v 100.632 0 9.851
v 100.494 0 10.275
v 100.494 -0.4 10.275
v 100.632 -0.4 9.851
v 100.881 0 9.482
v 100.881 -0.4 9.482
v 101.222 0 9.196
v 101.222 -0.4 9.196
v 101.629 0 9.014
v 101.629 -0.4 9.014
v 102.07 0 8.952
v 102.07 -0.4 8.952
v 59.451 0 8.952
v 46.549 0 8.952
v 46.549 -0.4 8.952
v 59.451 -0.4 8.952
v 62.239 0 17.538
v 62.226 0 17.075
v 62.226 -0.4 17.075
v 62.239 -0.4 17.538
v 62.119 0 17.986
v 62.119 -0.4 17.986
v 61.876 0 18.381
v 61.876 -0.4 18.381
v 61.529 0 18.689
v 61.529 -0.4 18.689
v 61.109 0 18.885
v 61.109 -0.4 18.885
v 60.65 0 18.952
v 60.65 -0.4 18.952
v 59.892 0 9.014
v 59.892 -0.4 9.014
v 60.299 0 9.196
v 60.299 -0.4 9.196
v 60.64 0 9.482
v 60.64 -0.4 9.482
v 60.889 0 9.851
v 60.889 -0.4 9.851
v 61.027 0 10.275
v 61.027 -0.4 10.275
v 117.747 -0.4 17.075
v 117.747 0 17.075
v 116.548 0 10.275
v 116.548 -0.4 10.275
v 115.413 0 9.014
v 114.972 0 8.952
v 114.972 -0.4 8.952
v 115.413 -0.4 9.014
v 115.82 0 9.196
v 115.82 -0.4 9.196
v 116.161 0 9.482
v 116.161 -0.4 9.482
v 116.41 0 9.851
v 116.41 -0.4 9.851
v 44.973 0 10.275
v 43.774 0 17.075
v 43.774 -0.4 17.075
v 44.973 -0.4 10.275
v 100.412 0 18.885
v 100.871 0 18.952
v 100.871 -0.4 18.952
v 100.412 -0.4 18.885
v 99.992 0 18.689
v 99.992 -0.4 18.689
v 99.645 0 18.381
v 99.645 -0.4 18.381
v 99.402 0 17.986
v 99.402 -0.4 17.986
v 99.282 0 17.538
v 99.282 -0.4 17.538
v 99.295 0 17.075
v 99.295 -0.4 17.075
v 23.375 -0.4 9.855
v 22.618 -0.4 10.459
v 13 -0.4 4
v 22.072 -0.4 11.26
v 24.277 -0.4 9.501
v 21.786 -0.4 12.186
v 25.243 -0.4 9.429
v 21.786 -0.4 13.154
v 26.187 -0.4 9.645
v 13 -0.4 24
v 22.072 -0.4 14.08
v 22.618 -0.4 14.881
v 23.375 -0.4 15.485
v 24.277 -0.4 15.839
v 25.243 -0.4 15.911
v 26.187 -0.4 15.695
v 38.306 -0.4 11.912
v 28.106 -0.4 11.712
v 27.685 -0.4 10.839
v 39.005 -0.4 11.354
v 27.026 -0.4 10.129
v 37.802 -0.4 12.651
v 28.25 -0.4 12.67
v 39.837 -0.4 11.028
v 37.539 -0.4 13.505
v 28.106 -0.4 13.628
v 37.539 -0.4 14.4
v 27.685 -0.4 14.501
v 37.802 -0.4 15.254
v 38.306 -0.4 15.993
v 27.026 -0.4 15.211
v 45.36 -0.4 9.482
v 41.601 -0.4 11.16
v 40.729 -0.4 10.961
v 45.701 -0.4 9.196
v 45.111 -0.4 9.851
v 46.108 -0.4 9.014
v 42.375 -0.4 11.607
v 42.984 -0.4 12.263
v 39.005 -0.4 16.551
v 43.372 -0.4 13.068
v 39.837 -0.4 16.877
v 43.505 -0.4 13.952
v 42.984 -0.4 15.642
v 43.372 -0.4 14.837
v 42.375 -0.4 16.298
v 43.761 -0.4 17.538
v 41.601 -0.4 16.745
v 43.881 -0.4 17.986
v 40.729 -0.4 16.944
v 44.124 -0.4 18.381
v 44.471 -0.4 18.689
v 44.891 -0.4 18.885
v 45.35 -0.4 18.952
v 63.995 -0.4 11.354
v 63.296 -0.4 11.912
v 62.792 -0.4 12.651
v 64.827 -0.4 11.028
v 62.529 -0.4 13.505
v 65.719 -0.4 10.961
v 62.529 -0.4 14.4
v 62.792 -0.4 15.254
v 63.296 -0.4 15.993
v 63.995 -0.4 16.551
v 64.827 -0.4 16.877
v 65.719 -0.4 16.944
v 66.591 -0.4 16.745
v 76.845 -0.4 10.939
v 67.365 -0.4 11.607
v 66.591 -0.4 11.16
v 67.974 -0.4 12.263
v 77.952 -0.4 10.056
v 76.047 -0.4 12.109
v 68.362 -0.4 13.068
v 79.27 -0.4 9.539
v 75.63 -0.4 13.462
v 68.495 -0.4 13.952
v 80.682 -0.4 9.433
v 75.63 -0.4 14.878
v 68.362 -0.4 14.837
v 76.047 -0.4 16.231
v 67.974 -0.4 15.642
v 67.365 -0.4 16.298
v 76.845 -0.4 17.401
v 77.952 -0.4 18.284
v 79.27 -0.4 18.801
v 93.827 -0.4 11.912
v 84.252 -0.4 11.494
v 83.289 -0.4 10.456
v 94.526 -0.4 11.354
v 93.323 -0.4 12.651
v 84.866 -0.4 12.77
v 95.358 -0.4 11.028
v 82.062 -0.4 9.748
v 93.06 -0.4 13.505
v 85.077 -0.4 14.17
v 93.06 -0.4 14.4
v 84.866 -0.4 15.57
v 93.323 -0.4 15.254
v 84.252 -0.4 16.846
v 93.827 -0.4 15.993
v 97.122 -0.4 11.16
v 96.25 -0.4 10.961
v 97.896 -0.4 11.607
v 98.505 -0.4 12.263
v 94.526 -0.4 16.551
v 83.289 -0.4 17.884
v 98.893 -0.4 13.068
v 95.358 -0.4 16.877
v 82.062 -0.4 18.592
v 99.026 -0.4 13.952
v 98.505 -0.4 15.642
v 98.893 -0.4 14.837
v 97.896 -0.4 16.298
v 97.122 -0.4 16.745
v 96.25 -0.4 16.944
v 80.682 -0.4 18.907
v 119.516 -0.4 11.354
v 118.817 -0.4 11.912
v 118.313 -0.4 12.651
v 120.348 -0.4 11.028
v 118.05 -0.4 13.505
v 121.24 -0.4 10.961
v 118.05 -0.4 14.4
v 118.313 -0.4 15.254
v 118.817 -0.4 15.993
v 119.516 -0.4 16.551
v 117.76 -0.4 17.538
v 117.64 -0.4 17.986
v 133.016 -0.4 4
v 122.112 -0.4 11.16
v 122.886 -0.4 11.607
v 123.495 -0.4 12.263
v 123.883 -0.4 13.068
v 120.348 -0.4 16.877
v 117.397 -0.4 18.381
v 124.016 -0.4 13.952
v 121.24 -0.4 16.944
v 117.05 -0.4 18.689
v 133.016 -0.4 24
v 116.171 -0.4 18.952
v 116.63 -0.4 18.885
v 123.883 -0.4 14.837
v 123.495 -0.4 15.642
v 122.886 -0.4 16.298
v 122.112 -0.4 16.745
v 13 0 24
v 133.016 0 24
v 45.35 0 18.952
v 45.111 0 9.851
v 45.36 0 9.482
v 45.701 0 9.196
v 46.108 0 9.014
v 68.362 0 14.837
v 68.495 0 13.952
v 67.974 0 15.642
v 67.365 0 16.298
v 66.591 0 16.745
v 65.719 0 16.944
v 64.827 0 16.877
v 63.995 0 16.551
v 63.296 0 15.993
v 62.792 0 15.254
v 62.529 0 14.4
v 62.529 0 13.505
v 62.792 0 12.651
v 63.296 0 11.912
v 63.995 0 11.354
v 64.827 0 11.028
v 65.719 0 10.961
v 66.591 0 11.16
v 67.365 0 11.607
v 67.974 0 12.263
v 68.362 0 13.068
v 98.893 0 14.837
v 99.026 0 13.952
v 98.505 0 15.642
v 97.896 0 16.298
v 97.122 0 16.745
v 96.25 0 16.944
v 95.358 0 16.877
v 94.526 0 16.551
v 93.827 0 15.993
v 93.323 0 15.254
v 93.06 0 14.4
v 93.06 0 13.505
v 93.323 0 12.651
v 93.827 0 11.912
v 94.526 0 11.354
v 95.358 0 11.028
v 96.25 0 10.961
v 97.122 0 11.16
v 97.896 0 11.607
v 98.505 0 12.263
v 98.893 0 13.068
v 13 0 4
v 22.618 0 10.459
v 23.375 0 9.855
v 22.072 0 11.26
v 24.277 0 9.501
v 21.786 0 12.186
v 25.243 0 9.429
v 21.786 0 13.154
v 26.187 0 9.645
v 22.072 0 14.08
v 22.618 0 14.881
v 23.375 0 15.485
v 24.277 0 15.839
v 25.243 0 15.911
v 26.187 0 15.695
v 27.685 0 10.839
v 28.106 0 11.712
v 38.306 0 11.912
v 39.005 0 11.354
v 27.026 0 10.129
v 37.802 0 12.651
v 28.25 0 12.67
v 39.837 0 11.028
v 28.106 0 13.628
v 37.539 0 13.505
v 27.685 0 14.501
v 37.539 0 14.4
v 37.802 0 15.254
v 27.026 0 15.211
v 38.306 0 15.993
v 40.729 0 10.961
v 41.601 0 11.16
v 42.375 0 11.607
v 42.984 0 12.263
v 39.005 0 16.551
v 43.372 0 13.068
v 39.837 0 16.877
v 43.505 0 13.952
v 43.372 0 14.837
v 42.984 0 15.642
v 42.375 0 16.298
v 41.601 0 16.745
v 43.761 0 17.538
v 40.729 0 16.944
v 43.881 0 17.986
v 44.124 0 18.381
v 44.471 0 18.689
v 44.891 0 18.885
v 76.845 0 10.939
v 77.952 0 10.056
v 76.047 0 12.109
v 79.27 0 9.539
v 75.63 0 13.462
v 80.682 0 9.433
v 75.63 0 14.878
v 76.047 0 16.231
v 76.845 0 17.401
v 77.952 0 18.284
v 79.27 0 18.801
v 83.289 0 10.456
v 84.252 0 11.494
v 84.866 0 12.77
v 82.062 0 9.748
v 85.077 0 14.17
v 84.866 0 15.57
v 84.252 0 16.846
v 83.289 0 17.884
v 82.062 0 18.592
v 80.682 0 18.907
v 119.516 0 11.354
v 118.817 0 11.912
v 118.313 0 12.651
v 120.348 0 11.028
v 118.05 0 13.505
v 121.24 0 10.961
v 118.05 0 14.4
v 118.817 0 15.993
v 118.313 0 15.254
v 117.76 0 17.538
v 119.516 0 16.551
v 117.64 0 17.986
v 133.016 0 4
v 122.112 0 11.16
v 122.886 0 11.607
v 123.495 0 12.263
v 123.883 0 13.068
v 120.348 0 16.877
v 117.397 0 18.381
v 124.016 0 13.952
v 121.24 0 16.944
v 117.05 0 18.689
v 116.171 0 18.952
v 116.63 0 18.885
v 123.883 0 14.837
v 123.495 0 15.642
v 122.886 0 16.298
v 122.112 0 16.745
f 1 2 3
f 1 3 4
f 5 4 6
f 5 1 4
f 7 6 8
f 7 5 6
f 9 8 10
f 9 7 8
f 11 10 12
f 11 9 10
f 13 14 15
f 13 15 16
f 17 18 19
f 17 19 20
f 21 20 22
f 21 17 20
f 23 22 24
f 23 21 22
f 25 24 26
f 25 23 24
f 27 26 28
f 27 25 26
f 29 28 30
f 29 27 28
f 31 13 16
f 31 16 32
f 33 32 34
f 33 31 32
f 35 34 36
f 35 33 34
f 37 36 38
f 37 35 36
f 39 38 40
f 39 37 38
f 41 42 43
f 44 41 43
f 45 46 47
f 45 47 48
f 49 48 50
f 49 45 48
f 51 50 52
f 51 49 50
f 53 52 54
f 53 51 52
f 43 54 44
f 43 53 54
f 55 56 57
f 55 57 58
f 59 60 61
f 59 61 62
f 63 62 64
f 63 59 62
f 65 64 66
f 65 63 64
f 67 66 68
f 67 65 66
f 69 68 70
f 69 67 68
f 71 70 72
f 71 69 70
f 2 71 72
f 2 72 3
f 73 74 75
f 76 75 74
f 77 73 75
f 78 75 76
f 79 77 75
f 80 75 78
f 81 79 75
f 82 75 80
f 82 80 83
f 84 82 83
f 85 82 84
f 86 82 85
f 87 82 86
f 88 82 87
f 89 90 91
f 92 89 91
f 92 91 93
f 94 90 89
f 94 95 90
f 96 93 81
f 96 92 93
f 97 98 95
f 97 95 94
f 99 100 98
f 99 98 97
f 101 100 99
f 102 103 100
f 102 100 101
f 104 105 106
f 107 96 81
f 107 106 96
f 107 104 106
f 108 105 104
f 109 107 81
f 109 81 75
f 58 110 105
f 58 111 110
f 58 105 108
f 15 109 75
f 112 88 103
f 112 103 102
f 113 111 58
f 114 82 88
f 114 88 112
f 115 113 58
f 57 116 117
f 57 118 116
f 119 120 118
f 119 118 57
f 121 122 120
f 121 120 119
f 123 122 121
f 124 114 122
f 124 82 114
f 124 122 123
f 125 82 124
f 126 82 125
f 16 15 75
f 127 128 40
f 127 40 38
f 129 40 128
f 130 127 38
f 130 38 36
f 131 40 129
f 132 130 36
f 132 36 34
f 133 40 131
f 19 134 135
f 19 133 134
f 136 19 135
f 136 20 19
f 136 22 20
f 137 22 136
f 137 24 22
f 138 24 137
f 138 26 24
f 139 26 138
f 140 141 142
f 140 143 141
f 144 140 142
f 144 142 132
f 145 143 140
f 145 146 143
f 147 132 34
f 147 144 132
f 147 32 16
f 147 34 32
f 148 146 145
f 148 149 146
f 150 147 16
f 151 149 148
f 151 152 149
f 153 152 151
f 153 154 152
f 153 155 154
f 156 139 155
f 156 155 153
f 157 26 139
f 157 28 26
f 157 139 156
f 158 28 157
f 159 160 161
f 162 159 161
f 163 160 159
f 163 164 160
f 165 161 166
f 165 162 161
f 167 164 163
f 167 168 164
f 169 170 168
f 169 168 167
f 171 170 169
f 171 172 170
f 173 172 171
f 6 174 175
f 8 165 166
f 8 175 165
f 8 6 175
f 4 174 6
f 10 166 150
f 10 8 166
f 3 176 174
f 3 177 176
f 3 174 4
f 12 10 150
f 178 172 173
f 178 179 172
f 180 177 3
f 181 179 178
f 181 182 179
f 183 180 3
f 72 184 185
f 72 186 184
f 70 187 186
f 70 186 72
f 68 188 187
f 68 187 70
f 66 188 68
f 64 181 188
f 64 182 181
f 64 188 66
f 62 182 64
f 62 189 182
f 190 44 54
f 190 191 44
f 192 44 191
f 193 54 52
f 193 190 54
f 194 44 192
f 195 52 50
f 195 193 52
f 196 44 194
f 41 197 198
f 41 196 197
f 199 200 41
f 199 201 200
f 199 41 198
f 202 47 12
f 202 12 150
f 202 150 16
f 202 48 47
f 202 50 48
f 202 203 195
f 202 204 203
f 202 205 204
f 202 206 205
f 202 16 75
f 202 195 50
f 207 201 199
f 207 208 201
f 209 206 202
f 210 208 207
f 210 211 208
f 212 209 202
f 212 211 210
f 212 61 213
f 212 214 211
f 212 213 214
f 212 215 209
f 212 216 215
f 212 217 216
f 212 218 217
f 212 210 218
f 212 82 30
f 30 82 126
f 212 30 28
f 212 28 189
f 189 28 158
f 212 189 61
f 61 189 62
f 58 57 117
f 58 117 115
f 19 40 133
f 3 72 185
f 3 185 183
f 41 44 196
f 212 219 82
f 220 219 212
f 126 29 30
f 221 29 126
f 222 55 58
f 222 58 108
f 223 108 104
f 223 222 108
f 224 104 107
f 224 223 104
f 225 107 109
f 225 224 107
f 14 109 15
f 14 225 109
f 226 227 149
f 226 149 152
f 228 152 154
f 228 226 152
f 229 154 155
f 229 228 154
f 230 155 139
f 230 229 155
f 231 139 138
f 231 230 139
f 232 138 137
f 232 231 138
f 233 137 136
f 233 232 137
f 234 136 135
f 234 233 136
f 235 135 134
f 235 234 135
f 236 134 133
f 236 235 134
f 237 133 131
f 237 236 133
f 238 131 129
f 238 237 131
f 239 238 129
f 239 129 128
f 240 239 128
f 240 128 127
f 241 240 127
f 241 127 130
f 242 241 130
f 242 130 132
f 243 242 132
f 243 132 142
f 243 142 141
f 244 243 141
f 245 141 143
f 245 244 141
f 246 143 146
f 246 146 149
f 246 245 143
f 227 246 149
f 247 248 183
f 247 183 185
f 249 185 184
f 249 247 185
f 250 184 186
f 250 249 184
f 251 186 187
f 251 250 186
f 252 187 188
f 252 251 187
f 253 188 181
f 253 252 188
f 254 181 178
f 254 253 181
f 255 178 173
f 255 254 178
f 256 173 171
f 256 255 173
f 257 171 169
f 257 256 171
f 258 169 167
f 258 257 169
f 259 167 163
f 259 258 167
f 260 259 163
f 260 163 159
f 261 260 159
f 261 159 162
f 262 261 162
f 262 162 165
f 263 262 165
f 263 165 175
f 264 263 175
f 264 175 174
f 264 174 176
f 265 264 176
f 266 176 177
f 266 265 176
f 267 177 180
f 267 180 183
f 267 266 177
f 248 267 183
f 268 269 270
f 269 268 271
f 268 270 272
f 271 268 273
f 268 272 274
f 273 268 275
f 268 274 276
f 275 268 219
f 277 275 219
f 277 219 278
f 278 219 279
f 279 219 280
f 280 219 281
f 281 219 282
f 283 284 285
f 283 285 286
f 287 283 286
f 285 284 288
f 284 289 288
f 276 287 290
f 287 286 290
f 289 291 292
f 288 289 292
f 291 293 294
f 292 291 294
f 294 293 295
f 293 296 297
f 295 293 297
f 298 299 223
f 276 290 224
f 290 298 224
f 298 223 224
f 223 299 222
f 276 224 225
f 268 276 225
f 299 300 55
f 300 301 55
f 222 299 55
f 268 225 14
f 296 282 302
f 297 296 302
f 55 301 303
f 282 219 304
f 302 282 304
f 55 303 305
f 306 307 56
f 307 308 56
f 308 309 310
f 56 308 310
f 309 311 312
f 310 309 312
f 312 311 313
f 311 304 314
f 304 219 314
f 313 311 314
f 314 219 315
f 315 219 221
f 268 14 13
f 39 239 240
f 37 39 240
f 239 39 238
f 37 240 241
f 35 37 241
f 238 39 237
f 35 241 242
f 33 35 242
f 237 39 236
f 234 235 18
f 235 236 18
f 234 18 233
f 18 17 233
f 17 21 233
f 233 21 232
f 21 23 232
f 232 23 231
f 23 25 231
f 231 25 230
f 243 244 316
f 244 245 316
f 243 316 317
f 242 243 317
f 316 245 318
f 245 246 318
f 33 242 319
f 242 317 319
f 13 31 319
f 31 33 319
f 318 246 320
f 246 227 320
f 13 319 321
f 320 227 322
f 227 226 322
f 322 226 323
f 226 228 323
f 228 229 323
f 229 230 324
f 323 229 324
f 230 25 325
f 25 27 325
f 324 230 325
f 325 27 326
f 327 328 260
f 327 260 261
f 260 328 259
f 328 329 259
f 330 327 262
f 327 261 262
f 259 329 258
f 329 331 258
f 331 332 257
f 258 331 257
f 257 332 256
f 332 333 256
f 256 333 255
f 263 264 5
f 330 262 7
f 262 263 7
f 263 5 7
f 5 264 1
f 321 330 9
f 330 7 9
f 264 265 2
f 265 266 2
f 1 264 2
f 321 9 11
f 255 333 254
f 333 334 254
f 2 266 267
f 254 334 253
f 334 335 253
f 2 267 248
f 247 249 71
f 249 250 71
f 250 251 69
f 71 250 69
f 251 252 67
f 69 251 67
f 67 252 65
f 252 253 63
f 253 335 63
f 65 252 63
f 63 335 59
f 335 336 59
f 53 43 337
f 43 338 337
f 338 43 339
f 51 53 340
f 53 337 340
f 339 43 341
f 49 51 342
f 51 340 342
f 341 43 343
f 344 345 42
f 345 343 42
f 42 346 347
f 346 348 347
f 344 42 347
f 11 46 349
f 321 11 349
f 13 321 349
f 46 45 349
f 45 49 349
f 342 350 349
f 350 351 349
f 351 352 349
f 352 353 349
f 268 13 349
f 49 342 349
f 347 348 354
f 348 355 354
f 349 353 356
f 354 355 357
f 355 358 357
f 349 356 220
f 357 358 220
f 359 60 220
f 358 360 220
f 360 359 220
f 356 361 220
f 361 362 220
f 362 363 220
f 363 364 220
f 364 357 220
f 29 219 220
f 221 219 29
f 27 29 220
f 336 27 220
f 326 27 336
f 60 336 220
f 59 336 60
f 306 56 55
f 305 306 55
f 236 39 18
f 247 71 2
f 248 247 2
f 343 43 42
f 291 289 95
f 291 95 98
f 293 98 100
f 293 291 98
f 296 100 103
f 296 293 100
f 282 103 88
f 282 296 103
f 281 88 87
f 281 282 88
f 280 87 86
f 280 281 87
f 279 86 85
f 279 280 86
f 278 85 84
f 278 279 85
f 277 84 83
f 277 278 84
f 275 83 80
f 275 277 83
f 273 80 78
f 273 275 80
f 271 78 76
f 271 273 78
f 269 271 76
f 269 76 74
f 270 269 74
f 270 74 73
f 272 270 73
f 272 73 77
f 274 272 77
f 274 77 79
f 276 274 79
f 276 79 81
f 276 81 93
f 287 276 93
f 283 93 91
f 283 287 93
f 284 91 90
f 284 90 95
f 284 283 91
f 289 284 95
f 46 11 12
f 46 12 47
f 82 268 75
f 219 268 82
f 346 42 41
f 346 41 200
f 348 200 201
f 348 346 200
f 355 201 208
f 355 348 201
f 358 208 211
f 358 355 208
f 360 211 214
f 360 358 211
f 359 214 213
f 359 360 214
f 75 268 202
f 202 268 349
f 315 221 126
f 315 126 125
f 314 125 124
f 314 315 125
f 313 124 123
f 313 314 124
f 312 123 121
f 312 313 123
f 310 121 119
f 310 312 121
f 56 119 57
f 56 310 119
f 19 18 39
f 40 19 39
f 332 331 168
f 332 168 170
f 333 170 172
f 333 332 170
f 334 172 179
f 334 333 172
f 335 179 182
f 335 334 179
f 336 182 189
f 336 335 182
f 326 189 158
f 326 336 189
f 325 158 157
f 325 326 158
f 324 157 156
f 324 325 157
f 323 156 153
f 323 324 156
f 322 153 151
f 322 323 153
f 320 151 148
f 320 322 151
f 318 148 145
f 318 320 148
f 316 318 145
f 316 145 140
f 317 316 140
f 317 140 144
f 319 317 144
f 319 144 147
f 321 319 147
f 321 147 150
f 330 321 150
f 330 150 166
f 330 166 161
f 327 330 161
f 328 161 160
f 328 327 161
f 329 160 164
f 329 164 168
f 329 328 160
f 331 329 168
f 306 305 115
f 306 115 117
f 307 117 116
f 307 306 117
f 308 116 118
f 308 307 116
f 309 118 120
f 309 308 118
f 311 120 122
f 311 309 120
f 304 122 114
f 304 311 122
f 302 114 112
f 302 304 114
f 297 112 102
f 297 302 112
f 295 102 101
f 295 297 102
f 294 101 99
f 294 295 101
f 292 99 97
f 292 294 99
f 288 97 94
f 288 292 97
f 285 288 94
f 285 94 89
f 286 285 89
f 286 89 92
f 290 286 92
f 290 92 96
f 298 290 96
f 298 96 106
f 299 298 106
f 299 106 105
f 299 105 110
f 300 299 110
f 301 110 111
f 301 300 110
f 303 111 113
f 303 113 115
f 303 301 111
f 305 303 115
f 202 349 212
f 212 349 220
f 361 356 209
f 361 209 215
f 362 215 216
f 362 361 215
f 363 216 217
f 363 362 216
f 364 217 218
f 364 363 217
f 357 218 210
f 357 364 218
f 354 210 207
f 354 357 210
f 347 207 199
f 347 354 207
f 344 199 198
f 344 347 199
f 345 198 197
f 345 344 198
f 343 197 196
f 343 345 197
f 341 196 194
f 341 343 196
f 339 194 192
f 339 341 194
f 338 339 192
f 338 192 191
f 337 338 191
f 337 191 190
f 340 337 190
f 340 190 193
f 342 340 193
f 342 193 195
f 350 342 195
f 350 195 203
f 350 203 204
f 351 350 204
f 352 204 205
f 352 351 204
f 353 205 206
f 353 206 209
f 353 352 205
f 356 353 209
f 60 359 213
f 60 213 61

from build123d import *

# Parameters (mm, degrees)
SKETCH006_W   = 120.016
SKETCH006_H   = 20
SKETCH006_R   = 3.25
SKETCH006_R_2 = 3
SKETCH006_R_3 = 4.75
PAD_DEPTH     = 0.4


with BuildPart() as part:
    # Sketch006 → Pad (new body)
    with BuildSketch(Plane.XZ):
        with Locations((73.008, 14)):
            Rectangle(SKETCH006_W, SKETCH006_H)
        with Locations((25, 12.67)):
            Circle(SKETCH006_R, mode=Mode.SUBTRACT)
        with Locations((40.505, 13.9525)):
            Circle(SKETCH006_R_2, mode=Mode.SUBTRACT)
        with Locations((65.495, 13.9525)):
            Circle(SKETCH006_R_2, mode=Mode.SUBTRACT)
        with Locations((80.327, 14.17)):
            Circle(SKETCH006_R_3, mode=Mode.SUBTRACT)
        with Locations((96.026, 13.9525)):
            Circle(SKETCH006_R_2, mode=Mode.SUBTRACT)
        with Locations((121.016, 13.9525)):
            Circle(SKETCH006_R_2, mode=Mode.SUBTRACT)
        with BuildLine():
            Line((46.549023, 8.9525), (59.450977, 8.9525))
            ThreePointArc((59.450977, 8.9525), (60.479437, 9.326829), (61.026669, 10.274663))
            Line((62.225692, 17.074663), (61.026669, 10.274663))
            ThreePointArc((62.225692, 17.074663), (61.875671, 18.38096), (60.65, 18.9525))
            Line((60.65, 18.9525), (45.35, 18.9525))
            ThreePointArc((45.35, 18.9525), (44.124329, 18.38096), (43.774308, 17.074663))
            Line((43.774308, 17.074663), (44.973331, 10.274663))
            ThreePointArc((44.973331, 10.274663), (45.520563, 9.326829), (46.549023, 8.9525))
        make_face(mode=Mode.SUBTRACT)
        with BuildLine():
            Line((102.070023, 8.9525), (114.971977, 8.9525))
            ThreePointArc((114.971977, 8.9525), (116.000437, 9.326829), (116.547669, 10.274663))
            Line((117.746692, 17.074663), (116.547669, 10.274663))
            ThreePointArc((117.746692, 17.074663), (117.396671, 18.38096), (116.171, 18.9525))
            Line((116.171, 18.9525), (100.871, 18.9525))
            ThreePointArc((100.871, 18.9525), (99.645329, 18.38096), (99.295308, 17.074663))
            Line((99.295308, 17.074663), (100.494331, 10.274663))
            ThreePointArc((100.494331, 10.274663), (101.041563, 9.326829), (102.070023, 8.9525))
        make_face(mode=Mode.SUBTRACT)
    extrude(amount=PAD_DEPTH)


solid = part.part
